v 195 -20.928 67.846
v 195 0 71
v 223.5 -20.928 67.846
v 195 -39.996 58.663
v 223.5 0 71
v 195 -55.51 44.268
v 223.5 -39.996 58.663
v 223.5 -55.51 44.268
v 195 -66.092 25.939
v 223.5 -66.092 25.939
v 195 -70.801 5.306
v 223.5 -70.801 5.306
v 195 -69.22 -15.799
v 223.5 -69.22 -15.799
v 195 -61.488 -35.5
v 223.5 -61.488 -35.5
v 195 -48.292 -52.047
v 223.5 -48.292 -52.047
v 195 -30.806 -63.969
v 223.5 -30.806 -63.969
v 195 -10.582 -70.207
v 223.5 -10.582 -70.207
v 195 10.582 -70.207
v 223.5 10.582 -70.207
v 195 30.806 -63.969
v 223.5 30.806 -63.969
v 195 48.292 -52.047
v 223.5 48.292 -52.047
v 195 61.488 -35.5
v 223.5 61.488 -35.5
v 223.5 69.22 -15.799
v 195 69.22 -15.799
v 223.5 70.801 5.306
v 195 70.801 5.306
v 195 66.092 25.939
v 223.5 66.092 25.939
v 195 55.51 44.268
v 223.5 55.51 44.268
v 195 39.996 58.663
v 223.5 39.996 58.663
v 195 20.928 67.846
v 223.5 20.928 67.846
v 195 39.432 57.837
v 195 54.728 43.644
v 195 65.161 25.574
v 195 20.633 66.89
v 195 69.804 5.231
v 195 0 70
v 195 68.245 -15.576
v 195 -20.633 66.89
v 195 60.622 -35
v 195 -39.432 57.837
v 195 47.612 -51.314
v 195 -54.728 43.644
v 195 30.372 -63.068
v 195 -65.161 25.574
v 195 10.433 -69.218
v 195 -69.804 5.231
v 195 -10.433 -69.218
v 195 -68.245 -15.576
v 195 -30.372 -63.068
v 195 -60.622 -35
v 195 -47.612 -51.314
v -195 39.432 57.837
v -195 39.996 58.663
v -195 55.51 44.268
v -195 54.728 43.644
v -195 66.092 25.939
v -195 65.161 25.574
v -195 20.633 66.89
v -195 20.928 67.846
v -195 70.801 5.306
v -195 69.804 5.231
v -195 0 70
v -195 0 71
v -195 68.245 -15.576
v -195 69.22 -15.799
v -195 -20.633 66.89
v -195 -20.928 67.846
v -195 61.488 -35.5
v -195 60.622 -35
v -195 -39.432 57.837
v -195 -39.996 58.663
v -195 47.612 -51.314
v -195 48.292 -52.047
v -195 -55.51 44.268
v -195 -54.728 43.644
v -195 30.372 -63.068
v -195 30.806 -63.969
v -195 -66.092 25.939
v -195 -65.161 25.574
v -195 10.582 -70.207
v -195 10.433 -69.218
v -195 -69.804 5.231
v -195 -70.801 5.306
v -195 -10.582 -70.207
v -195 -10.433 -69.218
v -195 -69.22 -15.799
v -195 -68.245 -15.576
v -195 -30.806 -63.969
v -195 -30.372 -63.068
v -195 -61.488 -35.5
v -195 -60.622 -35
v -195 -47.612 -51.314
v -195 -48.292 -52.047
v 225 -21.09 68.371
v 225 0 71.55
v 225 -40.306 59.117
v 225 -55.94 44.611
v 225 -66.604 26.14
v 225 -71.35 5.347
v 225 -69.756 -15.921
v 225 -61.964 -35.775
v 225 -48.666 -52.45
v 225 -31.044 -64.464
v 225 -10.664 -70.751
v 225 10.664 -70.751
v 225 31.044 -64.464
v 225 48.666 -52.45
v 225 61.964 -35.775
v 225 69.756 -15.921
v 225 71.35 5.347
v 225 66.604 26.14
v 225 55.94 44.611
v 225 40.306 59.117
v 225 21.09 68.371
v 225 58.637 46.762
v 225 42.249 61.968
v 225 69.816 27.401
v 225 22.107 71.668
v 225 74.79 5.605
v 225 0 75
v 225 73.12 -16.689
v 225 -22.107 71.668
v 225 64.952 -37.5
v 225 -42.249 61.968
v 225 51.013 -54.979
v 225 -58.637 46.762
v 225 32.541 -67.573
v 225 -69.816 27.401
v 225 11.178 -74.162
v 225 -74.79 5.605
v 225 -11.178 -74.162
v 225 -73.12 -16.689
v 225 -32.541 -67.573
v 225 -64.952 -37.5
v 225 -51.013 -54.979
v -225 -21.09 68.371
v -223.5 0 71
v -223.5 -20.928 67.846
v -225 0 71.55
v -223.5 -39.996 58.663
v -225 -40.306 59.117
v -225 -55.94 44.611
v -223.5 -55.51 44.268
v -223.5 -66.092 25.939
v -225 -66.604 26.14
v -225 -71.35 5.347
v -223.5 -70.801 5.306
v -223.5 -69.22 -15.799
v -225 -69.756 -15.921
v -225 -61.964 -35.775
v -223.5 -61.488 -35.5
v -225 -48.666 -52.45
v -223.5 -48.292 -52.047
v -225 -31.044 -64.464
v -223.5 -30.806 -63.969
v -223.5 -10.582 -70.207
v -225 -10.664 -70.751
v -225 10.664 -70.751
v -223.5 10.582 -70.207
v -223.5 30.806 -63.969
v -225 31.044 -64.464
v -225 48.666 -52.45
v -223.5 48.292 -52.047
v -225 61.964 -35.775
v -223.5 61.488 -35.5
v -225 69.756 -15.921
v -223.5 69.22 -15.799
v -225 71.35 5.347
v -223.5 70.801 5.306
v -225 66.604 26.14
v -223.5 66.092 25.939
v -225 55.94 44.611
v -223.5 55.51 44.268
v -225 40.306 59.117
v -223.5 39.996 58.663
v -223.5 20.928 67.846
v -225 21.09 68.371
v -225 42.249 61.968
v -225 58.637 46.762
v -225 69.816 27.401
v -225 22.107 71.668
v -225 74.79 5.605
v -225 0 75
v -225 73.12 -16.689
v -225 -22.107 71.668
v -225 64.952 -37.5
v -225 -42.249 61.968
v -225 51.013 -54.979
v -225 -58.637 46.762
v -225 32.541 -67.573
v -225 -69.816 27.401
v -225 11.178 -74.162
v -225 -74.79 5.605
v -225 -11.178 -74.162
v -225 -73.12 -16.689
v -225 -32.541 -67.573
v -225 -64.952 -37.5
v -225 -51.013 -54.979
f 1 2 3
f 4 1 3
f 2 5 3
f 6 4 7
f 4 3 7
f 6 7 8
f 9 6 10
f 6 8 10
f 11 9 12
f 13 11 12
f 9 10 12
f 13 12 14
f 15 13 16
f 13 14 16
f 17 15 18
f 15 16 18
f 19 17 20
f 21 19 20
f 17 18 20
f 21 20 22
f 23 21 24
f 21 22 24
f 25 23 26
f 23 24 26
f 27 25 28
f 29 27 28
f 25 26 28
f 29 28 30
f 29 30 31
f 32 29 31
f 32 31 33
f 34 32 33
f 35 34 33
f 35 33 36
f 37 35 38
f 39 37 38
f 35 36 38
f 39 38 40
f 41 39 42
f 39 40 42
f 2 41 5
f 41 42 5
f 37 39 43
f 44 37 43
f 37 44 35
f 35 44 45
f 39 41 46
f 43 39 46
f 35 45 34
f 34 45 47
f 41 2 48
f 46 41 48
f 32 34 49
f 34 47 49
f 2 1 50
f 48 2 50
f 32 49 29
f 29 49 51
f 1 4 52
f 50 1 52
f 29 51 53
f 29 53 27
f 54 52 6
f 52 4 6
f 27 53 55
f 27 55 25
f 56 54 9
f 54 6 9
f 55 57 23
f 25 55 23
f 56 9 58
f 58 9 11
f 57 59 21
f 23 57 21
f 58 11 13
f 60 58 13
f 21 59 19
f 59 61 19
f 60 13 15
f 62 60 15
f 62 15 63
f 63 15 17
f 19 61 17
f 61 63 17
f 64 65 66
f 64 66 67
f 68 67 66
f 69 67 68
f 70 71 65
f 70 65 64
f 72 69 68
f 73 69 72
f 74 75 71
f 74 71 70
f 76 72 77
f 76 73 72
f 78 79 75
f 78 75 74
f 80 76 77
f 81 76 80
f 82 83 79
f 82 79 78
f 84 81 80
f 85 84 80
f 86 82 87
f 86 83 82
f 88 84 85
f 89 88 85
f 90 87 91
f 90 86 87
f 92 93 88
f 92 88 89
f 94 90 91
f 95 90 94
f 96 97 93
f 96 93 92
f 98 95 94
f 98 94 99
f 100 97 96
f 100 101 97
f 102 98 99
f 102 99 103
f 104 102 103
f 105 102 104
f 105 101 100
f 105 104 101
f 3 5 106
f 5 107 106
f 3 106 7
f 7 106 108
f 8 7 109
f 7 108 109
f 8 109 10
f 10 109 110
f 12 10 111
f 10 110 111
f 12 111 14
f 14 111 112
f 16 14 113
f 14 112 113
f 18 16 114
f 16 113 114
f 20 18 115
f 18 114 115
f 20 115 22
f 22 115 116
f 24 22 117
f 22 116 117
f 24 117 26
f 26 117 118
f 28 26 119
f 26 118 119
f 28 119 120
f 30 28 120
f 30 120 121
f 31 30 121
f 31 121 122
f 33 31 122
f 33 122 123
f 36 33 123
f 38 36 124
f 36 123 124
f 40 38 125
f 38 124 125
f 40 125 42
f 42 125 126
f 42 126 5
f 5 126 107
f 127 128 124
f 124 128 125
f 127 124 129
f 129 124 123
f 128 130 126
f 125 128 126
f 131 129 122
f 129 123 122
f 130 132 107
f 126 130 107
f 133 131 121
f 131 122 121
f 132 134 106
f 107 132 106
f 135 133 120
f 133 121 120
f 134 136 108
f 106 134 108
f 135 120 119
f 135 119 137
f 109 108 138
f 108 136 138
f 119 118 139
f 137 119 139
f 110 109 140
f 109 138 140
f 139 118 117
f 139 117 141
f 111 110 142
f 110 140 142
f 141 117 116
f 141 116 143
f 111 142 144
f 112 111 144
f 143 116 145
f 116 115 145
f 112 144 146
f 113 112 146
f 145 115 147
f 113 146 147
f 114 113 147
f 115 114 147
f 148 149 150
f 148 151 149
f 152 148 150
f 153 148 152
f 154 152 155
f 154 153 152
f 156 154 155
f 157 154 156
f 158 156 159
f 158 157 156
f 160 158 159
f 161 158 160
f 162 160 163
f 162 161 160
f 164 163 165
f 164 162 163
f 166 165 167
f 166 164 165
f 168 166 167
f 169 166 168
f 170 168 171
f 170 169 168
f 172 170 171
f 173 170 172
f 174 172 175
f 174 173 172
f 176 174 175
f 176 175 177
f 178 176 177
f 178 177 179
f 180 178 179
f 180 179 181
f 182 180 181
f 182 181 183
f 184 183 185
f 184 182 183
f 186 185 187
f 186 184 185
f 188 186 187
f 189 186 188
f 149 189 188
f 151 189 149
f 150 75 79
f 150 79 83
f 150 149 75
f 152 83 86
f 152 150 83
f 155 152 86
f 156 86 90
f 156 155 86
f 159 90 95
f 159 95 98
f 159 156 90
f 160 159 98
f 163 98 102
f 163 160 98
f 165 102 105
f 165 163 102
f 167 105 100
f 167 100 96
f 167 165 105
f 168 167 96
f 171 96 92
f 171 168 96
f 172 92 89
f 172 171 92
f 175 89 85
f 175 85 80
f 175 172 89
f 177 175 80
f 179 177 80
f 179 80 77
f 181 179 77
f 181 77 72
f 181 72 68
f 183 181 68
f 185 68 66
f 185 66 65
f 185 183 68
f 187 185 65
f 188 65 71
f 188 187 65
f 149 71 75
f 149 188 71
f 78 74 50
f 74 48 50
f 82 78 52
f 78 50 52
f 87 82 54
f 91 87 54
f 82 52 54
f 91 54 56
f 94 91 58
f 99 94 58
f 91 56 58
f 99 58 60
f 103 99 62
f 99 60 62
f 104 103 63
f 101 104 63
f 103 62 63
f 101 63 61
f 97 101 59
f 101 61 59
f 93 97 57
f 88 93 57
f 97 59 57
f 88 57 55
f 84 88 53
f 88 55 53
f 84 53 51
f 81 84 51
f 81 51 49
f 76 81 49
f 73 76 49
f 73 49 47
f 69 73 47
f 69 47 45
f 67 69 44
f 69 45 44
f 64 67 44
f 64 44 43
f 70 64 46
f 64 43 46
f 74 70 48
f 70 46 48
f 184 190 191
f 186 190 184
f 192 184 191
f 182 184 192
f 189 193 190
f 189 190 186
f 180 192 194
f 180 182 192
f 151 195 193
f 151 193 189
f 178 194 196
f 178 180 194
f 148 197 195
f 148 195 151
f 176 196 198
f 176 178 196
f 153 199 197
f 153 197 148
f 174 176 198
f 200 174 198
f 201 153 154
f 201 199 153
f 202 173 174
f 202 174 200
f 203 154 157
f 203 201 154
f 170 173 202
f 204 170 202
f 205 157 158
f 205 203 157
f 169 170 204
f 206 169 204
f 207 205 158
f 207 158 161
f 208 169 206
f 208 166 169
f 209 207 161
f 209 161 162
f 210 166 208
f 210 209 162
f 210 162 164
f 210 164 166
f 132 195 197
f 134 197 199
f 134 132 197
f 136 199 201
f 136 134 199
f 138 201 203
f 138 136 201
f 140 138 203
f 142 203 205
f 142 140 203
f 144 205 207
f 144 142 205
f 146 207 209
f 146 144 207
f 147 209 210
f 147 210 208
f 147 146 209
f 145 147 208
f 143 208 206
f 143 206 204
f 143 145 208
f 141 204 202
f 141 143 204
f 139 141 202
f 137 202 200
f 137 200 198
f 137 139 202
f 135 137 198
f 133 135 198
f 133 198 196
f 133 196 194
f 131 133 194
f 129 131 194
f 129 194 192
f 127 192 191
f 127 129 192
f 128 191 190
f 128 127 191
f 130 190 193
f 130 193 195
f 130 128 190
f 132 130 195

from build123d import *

# Parameters (mm, degrees)
SKETCH_1_W = 450
SKETCH_1_H = 5


with BuildPart() as part:
    # ｽｹｯﾁ1 → Revolve 585 (revolve)
    with BuildSketch(Plane.XY, mode=Mode.PRIVATE) as revolve_585_sk:
        with Locations((0, 72.5)):
            Rectangle(SKETCH_1_W, SKETCH_1_H)
    revolve(revolve_585_sk.sketch.rotate(Axis((0, 0, 0), (1, 0, 0)), 90), axis=Axis((0, 0, 0), (1, 0, 0)))

    # ｽｹｯﾁ2 → Cut-Revolve 639 (revolve, cut)
    with BuildSketch(Plane.XY, mode=Mode.PRIVATE) as cut_revolve_639_sk:
        Polygon((195, 70), (195, 71), (223.5, 71), (225, 71.55), (225, 70), align=None)
    cut_revolve_639 = revolve(cut_revolve_639_sk.sketch.rotate(Axis((0, 0, 0), (1, 0, 0)), 90), axis=Axis((0, 0, 0), (1, 0, 0)), mode=Mode.SUBTRACT)

    # Mirror 681: Cut-Revolve 639 across plane
    add(cut_revolve_639.mirror(Plane(origin=(0, 0, 0), x_dir=(0, 0, 1), z_dir=(1, 0, 0))), mode=Mode.SUBTRACT)


solid = part.part
